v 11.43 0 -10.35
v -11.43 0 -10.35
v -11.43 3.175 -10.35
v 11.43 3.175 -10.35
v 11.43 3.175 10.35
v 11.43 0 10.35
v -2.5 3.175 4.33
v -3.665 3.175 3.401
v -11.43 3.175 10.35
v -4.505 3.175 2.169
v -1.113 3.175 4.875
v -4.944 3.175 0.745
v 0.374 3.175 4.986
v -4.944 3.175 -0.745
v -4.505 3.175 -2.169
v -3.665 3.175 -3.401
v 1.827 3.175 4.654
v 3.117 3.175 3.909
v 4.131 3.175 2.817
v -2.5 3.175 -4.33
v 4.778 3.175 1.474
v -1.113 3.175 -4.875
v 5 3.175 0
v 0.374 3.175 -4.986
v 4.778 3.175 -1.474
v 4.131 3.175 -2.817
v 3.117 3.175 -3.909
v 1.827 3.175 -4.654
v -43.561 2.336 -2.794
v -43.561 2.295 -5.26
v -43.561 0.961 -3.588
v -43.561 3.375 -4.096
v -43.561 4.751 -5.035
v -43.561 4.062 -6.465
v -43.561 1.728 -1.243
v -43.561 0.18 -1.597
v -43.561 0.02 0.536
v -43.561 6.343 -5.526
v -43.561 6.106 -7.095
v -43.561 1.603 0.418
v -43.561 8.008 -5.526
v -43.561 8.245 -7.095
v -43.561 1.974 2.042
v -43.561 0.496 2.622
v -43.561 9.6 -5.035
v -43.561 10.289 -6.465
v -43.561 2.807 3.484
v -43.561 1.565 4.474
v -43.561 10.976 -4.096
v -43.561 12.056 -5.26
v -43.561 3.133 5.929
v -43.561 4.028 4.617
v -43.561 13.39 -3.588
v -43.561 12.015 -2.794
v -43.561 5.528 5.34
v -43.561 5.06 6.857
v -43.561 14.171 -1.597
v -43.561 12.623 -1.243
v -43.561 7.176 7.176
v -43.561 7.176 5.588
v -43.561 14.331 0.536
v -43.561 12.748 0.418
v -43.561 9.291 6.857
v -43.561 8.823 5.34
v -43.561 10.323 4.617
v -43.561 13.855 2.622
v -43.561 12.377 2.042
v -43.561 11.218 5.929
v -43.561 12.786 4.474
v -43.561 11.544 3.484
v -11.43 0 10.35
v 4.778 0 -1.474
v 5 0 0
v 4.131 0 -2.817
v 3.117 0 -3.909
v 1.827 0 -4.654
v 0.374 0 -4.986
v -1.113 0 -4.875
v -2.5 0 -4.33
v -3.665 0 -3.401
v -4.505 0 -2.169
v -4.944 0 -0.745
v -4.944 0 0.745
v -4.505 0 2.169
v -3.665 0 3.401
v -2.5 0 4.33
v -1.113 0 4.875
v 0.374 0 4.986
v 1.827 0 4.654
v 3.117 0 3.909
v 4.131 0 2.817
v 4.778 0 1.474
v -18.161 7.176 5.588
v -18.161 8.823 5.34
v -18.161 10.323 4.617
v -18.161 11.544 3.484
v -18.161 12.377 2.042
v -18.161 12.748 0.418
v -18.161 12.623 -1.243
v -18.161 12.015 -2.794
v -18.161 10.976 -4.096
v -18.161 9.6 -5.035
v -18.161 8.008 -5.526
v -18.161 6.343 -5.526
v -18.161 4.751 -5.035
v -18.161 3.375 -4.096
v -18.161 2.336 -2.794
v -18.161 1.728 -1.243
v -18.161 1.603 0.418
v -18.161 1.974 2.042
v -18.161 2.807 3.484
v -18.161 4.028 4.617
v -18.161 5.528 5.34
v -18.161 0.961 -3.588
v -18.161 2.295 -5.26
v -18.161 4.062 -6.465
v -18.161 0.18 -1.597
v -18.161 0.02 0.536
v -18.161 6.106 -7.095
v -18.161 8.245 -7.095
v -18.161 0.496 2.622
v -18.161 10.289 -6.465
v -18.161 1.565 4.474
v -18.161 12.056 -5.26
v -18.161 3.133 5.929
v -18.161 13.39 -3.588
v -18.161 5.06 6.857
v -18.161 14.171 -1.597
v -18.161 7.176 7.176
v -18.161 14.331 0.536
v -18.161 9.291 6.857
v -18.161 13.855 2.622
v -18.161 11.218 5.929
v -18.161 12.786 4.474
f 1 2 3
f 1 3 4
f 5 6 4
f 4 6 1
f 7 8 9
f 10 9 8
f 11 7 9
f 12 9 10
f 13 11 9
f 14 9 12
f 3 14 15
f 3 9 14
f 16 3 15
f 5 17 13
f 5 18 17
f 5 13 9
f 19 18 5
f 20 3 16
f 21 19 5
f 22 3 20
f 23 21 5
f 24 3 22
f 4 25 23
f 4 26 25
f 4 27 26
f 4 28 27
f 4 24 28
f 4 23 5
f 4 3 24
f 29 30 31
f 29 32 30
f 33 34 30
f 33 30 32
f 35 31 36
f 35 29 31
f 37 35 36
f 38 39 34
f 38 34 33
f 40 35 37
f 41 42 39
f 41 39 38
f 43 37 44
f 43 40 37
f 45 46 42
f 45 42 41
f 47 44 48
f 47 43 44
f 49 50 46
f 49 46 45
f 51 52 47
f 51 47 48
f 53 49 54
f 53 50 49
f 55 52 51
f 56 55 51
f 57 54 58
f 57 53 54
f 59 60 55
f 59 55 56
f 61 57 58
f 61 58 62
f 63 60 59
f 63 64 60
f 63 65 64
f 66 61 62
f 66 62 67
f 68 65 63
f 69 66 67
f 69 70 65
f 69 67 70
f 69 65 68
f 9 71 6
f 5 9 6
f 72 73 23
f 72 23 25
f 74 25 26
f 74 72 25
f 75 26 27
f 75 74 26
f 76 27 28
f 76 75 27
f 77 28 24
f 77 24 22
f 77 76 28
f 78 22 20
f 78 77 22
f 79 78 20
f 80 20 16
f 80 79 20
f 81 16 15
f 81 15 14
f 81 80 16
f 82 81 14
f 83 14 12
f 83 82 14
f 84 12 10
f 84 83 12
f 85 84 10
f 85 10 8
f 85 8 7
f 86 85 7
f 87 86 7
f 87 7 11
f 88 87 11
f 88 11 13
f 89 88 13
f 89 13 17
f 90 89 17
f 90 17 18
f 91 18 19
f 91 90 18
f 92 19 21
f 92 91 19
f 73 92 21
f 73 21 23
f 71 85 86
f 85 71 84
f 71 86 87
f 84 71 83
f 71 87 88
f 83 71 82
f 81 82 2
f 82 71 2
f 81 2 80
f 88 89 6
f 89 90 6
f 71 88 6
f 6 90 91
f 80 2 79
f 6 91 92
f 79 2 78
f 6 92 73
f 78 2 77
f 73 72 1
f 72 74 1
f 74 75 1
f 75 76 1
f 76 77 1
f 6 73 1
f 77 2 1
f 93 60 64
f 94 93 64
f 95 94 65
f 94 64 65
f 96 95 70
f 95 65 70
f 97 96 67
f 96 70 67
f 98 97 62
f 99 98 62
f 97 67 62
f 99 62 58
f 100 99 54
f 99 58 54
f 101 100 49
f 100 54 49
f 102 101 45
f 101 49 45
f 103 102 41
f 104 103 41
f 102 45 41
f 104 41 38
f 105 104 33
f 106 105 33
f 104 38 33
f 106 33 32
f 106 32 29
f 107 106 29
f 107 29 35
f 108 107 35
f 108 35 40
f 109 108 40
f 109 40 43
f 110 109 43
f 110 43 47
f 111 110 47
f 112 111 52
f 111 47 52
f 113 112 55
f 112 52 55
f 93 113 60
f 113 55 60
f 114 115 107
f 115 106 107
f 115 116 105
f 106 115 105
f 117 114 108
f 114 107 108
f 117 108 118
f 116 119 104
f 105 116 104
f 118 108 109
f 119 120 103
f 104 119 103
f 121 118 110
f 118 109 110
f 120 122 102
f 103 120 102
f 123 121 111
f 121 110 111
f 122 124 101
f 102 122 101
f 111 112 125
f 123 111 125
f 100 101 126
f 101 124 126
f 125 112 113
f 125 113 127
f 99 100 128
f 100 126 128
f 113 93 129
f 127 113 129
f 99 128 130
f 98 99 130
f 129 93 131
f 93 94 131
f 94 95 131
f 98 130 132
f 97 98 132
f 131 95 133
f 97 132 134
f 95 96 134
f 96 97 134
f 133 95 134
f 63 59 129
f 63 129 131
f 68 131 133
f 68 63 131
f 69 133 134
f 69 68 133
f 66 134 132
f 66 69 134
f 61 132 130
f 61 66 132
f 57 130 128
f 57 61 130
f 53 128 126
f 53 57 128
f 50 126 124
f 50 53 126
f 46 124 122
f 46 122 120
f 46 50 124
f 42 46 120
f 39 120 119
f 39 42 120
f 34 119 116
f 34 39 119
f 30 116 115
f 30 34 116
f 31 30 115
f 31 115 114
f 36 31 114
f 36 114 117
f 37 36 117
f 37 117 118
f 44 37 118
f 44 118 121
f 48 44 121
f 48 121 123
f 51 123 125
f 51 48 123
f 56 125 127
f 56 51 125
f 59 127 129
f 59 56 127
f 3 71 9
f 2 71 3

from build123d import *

# Parameters (mm, degrees)
SKETCH1_W           = 22.86
SKETCH1_H           = 20.701
SKETCH1_R           = 5
BOSS_EXTRUDE1_DEPTH = 3.175
SKETCH2_R           = 7.1755
SKETCH2_R_2         = 5.588
EXTRUDE_THIN1_DEPTH = 25.4


with BuildPart() as part:
    # Sketch1 → Boss-Extrude1 (new body)
    with BuildSketch(Plane(origin=(0, 0, 0), x_dir=(1, 0, 0), z_dir=(0, 1, 0))):
        Rectangle(SKETCH1_W, SKETCH1_H)
        Circle(SKETCH1_R, mode=Mode.SUBTRACT)
    extrude(amount=BOSS_EXTRUDE1_DEPTH)


with BuildPart() as body_2:
    # Sketch2 → Extrude-Thin1 (new body)
    with BuildSketch(Plane.ZY.offset(43.561)):
        with Locations((0, 7.1755)):
            Circle(SKETCH2_R)
        with Locations((0, 7.1755)):
            Circle(SKETCH2_R_2, mode=Mode.SUBTRACT)
    extrude(amount=-EXTRUDE_THIN1_DEPTH)


solid = Compound([part.part, body_2.part])
